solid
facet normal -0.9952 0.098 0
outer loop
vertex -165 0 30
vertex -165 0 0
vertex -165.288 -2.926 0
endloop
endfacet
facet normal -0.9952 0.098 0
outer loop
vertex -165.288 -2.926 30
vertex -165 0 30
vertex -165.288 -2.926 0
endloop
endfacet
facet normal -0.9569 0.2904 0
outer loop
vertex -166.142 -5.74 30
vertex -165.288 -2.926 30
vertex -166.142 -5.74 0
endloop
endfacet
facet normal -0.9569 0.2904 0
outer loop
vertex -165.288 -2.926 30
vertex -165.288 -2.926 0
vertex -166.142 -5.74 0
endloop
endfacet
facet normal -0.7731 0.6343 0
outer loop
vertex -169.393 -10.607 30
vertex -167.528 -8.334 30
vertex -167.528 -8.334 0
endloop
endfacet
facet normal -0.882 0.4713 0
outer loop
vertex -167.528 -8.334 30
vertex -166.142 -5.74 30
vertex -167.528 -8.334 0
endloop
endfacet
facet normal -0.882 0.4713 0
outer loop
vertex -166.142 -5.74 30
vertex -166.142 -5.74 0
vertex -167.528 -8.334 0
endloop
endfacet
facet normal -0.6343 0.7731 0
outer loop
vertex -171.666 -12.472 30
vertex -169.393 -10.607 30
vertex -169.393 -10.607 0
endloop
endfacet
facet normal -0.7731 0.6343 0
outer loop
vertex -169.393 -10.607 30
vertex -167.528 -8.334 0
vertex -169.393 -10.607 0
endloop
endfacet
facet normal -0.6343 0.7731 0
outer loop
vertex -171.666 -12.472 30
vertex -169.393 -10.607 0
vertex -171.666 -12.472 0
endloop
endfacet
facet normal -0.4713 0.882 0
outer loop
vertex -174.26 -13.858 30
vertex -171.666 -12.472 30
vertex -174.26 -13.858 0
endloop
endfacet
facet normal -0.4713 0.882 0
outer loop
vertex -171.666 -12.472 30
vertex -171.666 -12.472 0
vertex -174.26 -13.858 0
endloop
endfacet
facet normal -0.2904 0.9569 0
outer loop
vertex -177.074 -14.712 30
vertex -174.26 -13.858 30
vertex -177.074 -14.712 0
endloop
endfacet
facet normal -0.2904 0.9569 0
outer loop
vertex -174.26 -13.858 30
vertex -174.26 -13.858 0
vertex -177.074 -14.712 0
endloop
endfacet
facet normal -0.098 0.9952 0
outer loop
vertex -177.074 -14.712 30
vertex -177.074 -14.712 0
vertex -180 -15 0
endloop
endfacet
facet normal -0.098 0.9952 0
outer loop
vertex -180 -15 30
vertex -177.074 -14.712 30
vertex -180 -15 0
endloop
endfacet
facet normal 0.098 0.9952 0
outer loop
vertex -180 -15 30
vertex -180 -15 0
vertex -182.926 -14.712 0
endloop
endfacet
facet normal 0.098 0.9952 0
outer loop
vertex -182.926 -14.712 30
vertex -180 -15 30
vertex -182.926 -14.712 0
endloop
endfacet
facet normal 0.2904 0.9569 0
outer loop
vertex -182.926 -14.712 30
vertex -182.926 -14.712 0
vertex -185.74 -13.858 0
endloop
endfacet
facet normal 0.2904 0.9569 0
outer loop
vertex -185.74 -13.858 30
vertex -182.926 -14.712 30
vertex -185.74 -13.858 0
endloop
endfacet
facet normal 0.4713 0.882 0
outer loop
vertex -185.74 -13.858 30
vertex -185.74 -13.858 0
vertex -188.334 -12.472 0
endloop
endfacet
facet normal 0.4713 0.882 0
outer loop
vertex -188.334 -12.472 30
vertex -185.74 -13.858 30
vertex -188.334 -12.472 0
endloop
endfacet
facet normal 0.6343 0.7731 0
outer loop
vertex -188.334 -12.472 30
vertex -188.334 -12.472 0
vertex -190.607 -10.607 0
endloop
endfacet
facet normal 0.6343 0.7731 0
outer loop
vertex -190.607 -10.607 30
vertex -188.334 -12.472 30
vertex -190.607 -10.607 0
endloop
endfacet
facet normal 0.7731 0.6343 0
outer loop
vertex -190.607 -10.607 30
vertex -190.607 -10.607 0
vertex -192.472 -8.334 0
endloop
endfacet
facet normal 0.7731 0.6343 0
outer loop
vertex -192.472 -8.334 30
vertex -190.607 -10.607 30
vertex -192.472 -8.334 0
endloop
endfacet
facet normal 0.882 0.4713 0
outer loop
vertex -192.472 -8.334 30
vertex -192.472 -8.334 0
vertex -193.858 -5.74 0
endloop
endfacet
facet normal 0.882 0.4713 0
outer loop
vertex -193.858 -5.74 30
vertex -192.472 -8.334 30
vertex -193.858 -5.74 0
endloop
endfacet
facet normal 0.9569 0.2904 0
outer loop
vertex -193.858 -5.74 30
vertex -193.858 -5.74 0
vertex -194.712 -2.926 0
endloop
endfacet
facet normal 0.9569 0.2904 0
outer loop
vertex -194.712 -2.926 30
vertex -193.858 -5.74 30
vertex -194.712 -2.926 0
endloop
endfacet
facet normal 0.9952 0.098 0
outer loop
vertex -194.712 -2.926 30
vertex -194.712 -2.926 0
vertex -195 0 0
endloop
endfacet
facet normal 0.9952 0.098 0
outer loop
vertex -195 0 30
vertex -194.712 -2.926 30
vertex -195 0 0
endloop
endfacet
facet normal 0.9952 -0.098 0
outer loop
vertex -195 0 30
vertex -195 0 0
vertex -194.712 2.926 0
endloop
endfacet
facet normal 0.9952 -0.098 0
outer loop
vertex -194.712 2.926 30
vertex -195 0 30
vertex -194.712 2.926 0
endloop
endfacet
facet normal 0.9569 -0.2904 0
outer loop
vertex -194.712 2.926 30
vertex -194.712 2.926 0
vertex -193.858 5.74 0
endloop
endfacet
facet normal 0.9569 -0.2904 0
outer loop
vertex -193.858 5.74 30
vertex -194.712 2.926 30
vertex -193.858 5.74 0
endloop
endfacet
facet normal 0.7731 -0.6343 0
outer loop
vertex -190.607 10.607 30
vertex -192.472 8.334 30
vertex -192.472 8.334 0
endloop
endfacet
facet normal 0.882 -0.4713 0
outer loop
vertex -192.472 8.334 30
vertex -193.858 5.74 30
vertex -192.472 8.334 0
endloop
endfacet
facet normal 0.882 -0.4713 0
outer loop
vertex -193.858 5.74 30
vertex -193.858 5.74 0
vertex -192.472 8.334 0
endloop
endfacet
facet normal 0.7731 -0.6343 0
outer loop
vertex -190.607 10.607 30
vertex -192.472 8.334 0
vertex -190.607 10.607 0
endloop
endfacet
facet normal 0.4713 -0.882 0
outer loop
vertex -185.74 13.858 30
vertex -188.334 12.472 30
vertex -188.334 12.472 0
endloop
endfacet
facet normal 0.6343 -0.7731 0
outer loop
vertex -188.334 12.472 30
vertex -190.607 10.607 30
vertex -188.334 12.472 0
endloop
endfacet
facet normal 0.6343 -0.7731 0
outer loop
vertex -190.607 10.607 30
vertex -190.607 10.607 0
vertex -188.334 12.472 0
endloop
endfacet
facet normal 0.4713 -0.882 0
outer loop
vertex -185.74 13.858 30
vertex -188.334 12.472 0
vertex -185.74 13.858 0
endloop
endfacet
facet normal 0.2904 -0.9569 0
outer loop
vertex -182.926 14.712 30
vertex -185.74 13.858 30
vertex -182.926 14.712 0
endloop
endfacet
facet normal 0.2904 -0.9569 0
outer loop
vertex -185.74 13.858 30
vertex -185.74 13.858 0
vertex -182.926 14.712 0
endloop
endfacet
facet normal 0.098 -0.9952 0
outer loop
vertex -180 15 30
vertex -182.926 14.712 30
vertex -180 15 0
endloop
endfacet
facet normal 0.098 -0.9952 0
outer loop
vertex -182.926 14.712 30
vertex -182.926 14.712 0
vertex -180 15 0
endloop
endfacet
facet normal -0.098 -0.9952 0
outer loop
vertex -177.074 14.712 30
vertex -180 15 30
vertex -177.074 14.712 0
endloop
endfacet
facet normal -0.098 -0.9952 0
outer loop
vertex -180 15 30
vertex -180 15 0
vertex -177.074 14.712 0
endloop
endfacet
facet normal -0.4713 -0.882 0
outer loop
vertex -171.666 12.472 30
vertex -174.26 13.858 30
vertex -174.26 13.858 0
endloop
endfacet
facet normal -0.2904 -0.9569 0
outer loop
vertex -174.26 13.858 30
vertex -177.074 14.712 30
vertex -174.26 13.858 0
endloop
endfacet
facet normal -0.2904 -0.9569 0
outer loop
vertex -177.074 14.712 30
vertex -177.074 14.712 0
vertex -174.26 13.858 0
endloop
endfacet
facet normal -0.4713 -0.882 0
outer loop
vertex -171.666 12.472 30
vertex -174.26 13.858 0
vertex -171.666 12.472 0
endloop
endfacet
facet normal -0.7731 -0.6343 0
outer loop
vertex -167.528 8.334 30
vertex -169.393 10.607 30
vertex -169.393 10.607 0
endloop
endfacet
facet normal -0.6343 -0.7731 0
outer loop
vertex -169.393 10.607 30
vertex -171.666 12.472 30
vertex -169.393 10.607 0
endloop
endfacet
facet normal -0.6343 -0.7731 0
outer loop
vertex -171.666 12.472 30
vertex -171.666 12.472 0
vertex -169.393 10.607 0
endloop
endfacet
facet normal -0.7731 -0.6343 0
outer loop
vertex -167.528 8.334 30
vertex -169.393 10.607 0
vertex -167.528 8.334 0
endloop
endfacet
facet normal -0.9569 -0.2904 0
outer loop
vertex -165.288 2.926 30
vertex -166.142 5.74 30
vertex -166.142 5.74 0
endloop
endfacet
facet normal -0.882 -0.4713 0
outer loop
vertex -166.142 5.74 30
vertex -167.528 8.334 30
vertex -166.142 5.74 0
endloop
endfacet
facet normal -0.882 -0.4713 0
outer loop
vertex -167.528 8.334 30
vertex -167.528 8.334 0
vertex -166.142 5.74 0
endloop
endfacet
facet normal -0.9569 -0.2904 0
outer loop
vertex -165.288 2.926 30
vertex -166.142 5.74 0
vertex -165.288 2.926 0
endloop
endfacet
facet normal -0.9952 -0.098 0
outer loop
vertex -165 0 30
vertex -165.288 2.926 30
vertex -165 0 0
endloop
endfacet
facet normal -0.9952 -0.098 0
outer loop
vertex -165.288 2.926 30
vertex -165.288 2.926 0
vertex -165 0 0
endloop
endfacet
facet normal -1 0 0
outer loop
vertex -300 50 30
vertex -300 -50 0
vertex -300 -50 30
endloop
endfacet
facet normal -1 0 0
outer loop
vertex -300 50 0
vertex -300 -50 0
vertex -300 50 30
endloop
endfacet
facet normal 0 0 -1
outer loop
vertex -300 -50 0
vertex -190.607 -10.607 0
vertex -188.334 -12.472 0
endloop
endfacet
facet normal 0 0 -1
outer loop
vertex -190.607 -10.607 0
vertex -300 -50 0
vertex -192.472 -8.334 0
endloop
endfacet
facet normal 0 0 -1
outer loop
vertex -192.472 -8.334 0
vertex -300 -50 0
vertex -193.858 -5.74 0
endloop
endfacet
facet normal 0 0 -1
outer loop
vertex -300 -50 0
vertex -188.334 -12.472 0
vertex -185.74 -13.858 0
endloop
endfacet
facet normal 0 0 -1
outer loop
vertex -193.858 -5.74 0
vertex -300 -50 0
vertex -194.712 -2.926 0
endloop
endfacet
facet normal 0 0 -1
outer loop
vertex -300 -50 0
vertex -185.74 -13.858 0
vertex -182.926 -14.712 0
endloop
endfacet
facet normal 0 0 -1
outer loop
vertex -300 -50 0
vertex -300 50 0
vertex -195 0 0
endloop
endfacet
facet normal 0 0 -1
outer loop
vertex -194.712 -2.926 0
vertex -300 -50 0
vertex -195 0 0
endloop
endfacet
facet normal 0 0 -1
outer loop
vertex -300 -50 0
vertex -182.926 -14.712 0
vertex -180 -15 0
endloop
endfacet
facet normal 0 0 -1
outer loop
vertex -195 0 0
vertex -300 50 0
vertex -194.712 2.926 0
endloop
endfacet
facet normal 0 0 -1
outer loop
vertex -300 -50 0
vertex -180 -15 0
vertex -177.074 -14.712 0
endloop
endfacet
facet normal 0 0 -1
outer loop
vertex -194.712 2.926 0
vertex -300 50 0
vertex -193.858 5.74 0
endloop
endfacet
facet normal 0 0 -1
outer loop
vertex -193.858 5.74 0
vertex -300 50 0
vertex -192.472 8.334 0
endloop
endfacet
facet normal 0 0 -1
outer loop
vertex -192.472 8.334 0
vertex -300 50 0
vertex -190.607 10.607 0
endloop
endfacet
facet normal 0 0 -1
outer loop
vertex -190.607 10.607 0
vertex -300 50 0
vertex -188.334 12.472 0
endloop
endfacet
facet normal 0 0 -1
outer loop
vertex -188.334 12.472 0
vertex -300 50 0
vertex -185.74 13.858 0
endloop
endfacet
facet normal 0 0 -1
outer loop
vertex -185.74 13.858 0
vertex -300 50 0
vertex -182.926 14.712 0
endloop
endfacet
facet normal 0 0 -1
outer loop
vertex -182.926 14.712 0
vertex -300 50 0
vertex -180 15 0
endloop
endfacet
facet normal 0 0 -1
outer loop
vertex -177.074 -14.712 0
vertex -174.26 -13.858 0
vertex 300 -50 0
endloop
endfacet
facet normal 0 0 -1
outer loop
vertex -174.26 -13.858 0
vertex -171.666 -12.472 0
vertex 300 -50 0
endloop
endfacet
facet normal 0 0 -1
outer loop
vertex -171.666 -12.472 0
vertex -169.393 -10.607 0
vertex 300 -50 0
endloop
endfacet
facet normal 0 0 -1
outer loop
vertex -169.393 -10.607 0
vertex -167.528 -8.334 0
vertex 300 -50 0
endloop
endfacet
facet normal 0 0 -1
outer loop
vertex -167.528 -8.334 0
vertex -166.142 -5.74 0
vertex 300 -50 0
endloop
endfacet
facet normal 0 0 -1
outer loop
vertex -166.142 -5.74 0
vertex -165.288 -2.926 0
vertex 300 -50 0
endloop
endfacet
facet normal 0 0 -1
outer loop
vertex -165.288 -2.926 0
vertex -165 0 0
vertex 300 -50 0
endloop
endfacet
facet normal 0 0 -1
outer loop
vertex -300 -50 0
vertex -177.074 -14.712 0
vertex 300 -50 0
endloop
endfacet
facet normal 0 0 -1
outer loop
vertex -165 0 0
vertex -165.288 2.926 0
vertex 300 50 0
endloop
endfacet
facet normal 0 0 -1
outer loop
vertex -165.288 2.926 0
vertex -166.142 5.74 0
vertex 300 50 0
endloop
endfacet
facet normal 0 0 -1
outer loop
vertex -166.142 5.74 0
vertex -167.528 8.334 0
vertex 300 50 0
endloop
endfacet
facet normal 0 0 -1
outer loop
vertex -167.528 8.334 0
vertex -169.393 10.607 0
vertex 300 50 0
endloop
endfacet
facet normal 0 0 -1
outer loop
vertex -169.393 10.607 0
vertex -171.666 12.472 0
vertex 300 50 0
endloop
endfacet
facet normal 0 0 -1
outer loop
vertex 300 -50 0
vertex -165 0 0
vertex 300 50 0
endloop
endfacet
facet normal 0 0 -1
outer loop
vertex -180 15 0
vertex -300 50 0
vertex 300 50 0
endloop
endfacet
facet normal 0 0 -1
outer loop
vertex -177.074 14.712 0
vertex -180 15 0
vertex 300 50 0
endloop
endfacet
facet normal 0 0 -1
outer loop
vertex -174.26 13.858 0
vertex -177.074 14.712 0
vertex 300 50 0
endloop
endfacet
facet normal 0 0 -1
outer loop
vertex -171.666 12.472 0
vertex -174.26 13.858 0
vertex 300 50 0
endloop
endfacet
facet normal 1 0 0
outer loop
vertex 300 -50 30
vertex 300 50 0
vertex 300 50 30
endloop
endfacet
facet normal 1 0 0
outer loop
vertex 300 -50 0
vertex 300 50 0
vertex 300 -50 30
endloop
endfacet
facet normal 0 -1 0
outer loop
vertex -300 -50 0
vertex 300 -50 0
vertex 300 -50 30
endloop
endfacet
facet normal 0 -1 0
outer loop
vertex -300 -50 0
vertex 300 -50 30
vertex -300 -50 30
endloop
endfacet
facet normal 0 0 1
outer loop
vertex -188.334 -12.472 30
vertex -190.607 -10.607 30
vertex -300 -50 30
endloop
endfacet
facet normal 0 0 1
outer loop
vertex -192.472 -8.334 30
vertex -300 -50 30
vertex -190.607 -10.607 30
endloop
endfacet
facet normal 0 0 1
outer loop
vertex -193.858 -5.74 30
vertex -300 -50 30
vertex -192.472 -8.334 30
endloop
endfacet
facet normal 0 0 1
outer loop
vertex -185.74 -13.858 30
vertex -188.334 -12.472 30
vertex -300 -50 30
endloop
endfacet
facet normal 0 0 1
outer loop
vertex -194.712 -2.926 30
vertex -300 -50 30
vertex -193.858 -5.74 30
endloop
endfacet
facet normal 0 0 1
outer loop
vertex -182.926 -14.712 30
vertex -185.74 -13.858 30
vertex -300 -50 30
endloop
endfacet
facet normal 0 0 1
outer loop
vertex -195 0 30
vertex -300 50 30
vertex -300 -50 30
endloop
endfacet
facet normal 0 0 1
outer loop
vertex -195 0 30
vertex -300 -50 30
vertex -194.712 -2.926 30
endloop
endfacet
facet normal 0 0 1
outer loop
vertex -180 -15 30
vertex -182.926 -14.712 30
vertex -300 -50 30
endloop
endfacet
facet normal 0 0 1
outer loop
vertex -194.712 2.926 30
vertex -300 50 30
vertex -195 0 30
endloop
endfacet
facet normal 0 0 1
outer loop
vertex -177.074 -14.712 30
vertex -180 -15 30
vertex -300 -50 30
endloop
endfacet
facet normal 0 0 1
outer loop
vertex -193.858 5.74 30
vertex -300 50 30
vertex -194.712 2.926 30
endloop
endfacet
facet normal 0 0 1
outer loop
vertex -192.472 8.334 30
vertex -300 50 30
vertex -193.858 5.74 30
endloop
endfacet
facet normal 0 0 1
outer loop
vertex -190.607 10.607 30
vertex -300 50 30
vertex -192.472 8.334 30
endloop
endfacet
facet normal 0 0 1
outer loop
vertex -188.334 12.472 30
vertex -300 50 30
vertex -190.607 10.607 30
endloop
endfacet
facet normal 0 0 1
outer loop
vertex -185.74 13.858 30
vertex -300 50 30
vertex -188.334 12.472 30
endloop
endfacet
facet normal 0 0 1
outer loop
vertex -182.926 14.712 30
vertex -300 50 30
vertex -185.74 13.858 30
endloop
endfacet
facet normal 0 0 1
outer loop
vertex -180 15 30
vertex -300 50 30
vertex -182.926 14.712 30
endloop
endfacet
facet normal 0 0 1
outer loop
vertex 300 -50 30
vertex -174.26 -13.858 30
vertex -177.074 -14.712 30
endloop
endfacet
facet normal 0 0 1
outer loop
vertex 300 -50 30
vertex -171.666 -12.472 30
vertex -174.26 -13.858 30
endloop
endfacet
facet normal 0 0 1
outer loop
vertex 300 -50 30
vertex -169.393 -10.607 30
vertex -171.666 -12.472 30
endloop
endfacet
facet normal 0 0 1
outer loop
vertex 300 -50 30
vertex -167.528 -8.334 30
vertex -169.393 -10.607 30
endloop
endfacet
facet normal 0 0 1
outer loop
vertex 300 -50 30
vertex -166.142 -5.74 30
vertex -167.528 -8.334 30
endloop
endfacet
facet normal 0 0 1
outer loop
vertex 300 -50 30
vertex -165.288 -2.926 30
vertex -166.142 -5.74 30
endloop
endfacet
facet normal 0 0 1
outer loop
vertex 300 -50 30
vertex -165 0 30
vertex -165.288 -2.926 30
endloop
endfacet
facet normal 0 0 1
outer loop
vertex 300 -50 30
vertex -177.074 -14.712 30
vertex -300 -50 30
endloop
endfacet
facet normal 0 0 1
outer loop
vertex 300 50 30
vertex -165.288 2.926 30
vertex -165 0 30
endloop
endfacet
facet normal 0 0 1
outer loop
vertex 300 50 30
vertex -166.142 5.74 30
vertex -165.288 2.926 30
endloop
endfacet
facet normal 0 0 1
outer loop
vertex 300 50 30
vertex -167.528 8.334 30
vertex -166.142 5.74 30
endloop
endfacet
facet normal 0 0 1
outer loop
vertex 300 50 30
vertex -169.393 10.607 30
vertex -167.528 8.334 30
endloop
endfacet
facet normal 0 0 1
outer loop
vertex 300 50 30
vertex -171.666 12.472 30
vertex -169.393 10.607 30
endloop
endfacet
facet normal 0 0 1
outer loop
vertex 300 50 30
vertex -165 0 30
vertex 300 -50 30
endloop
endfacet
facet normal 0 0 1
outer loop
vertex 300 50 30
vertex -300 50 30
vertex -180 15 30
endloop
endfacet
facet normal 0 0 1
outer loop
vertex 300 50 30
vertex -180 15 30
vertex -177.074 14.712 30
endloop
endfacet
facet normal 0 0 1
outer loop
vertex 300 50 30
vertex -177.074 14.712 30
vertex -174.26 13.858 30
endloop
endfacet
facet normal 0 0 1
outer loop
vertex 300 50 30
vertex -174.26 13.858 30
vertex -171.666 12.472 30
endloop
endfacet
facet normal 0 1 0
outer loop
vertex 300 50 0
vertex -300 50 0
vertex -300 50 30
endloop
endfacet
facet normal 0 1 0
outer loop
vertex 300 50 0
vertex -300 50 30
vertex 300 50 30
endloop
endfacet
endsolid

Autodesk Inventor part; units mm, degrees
ref_plane "YZ Plane" through (0, 0, 0) normal (1, 0, 0) x (0, 1, 0)
ref_plane "XZ Plane" through (0, 0, 0) normal (0, 1, 0) x (-1, 0, 0)
ref_plane "XY Plane" through (0, 0, 0) normal (0, 0, 1) x (1, 0, 0)
sketch "Эскиз1" plane through (0, 0, 0) normal (0, 0, 1) x (1, 0, 0)
  line L0 (300, -50) -> (-300, -50)
  line L1 (-300, -50) -> (-300, 50)
  line L2 (-300, 50) -> (300, 50)
  line L3 (300, 50) -> (300, -50)
  line L4 (300, -50) -> (-300, 50) construction
  line L5 (-300, -50) -> (300, 50) construction
  circle A0 centre (-180, 0) radius 15
  point P0 (0, 0)
  dimension "d0" = 100
  dimension "d1" = 600
  dimension "d4" = 30
  dimension "d5" = 120
extrude "Выдавливание1" add sketch "Эскиз1" along normal blind 30
properties material "Сталь, литейная"
